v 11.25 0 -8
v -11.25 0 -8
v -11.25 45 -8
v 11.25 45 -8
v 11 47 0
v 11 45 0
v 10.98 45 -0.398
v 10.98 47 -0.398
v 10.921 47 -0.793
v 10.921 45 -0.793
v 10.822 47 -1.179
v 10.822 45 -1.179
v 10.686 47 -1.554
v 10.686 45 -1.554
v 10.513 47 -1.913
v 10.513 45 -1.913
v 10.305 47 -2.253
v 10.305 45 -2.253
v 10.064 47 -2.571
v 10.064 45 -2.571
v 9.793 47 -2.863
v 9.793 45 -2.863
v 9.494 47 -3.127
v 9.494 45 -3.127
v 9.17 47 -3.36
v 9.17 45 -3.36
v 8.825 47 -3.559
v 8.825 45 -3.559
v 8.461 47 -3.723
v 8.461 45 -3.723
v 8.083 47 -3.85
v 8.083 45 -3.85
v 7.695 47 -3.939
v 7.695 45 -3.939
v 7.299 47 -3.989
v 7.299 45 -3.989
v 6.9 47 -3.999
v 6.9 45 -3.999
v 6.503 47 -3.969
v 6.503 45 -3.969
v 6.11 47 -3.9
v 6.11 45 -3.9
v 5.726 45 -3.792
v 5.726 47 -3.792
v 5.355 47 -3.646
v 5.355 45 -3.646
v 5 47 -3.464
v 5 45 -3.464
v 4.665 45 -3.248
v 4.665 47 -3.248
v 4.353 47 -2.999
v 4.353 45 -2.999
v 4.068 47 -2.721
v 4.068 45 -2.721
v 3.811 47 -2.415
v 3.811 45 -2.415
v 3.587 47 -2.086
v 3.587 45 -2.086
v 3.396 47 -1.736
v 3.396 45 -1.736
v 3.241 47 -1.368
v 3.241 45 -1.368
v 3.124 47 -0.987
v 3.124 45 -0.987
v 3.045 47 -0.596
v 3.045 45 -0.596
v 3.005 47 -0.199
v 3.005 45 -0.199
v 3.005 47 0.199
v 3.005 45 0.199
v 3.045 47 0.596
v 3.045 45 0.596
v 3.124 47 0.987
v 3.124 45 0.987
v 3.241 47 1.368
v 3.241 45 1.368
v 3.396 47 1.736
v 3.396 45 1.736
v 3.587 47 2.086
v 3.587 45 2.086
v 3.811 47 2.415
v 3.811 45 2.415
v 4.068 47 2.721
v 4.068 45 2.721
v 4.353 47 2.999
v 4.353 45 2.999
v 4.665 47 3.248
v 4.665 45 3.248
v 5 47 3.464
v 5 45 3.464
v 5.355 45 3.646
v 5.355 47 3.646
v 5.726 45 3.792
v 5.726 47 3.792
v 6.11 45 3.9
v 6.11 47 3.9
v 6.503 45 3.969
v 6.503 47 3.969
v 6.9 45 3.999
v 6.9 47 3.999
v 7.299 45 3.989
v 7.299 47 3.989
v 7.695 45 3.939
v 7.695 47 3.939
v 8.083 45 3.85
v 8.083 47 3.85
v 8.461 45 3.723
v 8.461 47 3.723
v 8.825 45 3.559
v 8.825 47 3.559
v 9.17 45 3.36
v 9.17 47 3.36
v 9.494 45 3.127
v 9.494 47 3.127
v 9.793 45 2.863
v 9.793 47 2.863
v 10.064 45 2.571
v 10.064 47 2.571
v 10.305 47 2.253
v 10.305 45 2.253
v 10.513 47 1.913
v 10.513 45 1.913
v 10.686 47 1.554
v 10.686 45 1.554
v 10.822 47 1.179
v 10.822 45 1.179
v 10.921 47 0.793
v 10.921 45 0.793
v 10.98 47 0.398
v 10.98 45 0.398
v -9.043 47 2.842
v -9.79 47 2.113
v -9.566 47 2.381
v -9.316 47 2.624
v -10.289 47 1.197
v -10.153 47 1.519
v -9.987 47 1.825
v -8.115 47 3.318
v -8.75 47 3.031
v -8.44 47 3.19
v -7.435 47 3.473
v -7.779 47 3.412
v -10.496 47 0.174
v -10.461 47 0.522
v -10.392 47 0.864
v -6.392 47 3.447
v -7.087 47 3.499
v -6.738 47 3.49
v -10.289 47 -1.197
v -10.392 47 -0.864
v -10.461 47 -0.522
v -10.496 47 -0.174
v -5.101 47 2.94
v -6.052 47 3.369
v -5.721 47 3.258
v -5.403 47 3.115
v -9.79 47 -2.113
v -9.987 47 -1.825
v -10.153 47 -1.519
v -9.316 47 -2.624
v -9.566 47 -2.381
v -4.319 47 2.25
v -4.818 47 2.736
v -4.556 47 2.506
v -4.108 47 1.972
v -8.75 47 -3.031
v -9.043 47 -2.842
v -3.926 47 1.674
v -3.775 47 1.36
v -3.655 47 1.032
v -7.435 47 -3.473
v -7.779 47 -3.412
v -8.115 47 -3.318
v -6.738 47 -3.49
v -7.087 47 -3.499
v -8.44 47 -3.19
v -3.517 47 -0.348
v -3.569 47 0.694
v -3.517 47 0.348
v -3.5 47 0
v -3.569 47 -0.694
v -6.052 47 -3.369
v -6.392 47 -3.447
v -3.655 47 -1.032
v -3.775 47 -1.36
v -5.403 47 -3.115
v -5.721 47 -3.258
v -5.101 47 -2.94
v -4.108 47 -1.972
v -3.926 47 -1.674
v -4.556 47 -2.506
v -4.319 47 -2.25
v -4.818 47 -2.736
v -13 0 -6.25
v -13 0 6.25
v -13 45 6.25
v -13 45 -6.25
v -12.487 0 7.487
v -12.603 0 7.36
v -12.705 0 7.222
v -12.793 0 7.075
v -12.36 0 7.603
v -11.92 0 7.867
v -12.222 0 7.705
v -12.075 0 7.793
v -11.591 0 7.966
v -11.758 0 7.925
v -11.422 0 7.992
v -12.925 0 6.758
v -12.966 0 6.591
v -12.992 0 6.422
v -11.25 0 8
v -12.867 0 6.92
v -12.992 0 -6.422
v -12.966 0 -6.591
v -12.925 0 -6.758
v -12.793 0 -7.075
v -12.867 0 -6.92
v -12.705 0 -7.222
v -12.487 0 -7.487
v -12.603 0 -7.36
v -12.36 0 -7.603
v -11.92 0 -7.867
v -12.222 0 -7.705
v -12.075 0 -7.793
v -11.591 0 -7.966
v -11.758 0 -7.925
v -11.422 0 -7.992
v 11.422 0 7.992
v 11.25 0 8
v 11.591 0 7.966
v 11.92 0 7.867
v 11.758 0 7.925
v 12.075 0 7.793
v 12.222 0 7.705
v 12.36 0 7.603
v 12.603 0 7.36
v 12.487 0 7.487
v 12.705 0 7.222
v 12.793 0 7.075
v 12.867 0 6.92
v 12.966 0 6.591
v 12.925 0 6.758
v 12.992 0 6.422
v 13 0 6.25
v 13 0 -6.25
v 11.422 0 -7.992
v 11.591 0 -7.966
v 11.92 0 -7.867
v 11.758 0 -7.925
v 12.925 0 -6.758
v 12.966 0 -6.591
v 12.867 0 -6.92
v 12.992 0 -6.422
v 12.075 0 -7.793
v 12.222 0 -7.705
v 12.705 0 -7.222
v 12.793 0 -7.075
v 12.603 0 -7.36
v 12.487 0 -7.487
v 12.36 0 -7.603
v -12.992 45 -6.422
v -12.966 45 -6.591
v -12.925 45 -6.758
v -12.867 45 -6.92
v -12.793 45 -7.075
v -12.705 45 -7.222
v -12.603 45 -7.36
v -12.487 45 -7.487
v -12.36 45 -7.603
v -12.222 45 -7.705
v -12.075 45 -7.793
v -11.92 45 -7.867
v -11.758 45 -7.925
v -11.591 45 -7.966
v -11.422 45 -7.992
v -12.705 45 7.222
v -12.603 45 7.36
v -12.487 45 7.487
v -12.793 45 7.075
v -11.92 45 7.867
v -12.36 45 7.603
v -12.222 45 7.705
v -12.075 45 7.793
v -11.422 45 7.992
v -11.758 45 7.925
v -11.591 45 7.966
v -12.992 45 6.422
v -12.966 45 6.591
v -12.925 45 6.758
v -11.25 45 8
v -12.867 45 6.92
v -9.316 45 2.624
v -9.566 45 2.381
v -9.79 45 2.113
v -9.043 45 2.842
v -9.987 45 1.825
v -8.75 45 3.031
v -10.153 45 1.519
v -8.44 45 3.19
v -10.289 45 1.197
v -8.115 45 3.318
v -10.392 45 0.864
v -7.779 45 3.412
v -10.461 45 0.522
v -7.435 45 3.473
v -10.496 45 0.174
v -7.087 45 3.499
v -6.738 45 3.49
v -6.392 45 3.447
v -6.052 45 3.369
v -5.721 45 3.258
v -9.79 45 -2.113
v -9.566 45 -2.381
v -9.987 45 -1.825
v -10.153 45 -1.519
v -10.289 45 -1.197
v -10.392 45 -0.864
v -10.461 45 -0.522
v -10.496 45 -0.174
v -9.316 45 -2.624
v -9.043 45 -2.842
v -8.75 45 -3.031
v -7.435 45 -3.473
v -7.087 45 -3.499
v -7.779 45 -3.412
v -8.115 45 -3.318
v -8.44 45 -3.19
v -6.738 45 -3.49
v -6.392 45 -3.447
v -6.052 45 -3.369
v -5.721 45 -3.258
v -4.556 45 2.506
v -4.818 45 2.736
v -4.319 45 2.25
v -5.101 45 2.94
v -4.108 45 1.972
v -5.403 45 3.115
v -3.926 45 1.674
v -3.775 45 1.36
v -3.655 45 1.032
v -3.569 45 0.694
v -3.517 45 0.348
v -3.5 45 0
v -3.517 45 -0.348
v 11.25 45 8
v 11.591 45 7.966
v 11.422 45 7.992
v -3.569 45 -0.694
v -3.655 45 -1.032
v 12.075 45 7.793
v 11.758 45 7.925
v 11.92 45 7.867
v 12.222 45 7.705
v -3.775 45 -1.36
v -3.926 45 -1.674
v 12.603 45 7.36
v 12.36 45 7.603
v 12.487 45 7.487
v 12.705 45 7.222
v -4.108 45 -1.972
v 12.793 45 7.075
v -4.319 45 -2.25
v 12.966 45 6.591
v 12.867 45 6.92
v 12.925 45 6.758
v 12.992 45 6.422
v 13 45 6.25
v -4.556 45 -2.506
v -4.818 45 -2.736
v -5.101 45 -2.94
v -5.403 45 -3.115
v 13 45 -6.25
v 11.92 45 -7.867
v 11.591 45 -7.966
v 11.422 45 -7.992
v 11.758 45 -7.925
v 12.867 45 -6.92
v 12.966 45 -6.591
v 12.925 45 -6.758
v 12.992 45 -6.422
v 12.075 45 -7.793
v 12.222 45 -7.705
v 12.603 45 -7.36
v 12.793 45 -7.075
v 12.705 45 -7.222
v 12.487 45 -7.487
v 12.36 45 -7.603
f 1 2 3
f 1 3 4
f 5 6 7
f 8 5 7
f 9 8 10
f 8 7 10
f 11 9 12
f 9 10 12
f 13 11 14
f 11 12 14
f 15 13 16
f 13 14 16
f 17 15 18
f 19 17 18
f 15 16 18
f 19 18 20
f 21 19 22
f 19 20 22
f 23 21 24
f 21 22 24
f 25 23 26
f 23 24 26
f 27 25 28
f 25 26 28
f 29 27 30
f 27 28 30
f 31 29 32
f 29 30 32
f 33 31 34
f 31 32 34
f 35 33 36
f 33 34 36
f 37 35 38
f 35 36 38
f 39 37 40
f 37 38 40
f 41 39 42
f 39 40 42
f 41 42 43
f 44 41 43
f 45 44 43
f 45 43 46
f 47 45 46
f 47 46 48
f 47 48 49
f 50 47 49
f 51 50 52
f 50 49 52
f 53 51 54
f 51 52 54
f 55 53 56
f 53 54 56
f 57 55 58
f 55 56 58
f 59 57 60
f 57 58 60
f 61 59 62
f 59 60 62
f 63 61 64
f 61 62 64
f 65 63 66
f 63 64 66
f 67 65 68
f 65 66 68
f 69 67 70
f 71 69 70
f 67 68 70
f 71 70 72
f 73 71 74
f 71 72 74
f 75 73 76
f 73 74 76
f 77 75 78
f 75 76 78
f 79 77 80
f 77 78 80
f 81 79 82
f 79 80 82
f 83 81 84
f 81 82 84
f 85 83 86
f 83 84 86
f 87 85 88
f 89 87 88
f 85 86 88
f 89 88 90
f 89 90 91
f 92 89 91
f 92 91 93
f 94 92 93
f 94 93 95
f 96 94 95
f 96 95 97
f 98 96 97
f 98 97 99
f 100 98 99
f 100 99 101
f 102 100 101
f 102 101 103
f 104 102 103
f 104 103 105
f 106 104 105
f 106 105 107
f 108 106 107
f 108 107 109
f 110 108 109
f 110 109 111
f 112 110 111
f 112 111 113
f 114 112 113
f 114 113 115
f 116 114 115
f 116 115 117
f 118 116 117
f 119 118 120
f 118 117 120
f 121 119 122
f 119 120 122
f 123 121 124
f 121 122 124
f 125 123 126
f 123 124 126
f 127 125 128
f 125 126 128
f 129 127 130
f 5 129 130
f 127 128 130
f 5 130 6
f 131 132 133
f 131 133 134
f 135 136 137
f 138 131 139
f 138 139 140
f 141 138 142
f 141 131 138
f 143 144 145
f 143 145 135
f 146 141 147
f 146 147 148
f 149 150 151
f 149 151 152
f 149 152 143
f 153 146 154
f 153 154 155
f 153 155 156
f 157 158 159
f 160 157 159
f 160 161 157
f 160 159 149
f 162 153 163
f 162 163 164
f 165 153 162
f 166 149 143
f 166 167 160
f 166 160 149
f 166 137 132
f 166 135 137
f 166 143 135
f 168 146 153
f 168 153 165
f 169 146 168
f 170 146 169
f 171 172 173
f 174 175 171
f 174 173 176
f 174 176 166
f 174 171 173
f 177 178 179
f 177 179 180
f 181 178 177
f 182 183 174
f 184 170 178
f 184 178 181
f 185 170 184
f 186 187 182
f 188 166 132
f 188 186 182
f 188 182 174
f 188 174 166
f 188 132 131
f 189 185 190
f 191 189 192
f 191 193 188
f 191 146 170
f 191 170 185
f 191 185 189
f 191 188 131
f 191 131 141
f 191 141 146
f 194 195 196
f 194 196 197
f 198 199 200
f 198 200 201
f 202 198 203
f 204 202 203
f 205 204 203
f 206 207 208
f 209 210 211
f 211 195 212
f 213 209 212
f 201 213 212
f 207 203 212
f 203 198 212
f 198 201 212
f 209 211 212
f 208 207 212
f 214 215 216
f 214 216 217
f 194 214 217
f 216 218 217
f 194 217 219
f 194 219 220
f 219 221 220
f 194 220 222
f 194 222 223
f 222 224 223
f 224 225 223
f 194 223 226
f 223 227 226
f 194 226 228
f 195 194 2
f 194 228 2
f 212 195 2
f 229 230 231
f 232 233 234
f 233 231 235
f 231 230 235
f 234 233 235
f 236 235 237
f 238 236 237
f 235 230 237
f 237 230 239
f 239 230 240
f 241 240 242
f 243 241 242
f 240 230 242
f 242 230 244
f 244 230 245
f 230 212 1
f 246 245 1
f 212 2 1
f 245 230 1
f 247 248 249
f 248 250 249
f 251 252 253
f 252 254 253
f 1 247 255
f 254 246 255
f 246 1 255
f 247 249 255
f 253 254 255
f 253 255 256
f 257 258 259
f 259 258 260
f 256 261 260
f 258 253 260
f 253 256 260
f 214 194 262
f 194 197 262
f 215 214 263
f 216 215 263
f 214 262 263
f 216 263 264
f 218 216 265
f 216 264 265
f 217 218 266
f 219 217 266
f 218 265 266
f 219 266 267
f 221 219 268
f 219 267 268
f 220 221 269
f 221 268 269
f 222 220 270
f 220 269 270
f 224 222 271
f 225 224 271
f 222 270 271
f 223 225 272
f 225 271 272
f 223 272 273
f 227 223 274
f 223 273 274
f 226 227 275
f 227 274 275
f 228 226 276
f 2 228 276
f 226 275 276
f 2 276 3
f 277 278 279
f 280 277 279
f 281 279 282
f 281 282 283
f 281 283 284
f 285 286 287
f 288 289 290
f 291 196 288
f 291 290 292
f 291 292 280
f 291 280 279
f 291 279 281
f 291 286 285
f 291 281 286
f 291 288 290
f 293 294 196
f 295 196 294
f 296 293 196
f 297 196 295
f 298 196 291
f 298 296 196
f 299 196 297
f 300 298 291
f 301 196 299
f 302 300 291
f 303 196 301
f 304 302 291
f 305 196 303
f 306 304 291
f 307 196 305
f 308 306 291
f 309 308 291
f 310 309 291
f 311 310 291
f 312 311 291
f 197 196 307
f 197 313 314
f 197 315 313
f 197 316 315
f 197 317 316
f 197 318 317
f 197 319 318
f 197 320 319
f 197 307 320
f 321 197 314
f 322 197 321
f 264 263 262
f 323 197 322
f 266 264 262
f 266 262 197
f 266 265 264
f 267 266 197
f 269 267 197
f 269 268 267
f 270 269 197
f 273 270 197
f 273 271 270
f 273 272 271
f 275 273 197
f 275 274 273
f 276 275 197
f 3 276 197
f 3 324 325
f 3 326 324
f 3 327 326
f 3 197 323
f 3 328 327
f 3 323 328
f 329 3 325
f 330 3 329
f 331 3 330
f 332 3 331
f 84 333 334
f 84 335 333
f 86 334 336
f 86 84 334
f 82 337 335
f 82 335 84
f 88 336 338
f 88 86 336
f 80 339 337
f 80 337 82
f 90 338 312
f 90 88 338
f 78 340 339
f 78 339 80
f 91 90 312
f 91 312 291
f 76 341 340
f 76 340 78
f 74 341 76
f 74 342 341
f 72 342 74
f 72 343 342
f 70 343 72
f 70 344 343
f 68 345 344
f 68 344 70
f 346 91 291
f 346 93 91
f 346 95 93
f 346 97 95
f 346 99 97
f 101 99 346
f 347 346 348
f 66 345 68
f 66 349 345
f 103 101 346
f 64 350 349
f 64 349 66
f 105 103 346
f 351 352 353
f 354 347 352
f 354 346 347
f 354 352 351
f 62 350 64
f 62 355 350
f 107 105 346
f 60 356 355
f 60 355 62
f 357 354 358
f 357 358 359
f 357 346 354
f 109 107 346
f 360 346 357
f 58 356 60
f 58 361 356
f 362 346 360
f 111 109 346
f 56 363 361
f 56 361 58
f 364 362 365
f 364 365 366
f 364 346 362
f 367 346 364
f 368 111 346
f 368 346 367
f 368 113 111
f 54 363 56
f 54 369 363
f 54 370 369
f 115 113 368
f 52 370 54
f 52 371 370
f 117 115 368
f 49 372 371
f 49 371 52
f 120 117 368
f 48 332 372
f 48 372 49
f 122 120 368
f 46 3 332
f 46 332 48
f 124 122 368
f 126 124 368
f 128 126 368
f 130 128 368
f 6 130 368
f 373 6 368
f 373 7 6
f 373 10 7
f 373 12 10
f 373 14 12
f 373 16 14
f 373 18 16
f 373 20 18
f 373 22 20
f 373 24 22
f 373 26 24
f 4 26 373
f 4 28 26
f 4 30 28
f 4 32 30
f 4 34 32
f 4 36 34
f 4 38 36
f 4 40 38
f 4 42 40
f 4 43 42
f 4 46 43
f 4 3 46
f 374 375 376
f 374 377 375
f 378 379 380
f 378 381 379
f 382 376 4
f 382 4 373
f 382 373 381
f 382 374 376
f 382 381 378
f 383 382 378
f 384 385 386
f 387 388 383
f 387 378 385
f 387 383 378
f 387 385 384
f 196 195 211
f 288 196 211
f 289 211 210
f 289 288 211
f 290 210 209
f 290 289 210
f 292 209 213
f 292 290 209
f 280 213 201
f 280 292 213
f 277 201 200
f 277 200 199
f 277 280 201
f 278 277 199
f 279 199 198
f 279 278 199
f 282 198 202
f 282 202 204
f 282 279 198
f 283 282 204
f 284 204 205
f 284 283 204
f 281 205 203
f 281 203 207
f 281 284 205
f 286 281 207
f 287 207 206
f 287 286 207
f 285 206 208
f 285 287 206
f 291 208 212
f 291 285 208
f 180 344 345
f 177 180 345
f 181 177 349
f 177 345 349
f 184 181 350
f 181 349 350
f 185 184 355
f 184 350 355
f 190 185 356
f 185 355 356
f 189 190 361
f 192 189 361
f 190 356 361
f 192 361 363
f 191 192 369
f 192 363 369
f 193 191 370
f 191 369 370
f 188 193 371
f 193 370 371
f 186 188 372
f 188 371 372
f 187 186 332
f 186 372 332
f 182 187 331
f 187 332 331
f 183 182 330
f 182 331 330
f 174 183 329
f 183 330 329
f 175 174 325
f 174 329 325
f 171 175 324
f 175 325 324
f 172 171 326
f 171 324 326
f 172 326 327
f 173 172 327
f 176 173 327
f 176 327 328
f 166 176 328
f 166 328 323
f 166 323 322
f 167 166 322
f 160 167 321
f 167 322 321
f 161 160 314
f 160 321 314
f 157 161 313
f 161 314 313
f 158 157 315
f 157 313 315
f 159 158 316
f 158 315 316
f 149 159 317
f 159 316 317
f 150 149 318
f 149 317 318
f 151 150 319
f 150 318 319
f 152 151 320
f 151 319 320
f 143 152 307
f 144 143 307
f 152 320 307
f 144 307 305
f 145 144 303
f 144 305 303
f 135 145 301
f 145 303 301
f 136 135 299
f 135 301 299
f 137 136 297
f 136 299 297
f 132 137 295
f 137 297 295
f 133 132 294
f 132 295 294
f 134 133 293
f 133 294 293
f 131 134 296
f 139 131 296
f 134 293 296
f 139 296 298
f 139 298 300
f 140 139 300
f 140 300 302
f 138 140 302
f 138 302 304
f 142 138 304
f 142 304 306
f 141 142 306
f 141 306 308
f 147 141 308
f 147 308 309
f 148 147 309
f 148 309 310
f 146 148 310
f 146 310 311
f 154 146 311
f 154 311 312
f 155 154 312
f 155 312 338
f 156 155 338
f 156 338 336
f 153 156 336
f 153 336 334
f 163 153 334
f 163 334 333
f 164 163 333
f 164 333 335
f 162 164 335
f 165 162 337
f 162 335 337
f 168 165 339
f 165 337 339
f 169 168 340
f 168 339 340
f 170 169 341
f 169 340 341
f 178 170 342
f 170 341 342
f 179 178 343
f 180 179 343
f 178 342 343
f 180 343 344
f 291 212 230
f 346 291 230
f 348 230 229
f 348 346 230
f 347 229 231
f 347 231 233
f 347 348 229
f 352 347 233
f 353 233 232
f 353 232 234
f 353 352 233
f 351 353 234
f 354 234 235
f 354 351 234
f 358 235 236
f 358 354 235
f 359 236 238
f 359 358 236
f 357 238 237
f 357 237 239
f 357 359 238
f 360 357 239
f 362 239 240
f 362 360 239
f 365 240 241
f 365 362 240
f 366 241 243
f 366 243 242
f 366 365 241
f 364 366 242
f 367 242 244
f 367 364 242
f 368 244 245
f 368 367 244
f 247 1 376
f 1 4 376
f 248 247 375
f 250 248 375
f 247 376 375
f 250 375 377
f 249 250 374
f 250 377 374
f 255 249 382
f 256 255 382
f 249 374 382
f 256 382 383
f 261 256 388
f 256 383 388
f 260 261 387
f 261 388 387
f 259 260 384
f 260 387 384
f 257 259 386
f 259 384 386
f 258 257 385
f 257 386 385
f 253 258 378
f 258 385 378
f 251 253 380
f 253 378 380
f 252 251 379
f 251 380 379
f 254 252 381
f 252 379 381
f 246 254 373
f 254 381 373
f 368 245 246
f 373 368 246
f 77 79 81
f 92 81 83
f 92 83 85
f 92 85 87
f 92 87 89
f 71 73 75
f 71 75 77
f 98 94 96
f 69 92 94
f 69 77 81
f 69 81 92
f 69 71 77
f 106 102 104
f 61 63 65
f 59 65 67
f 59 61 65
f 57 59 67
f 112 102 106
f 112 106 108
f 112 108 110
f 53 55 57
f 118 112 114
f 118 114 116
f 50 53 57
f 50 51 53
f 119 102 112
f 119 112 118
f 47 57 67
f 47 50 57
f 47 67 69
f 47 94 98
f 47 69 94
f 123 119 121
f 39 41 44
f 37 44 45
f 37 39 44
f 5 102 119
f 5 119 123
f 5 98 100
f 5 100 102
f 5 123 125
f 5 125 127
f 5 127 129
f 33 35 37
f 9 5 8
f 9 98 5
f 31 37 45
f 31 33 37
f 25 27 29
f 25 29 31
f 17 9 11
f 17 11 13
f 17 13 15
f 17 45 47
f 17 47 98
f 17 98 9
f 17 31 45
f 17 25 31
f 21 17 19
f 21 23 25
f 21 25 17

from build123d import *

# Parameters (mm, degrees)
SKETCH1_W           = 26
SKETCH1_H           = 16
BOSS_EXTRUDE1_DEPTH = 45
SKETCH2_R           = 3.5
SKETCH2_R_2         = 4
BOSS_EXTRUDE2_DEPTH = 2
FILLET1_R           = 1.75


with BuildPart() as part:
    # Sketch1 → Boss-Extrude1 (new body)
    with BuildSketch(Plane(origin=(0, 0, 0), x_dir=(1, 0, 0), z_dir=(0, 1, 0))):
        Rectangle(SKETCH1_W, SKETCH1_H)
    extrude(amount=BOSS_EXTRUDE1_DEPTH)

    # Sketch2 → Boss-Extrude2 (add)
    with BuildSketch(Plane(origin=(0, 45, 0), x_dir=(1, 0, 0), z_dir=(0, 1, 0))):
        with Locations((-7, 0)):
            Circle(SKETCH2_R)
        with Locations((7, 0)):
            Circle(SKETCH2_R_2)
    extrude(amount=BOSS_EXTRUDE2_DEPTH)

    # Fillet1
    fillet1_edges = [part.edges().sort_by_distance(p)[0] for p in [
        (13, 22.5, 8),
        (-13, 22.5, 8),
        (-13, 22.5, -8),
        (13, 22.5, -8),
    ]]
    fillet(fillet1_edges, radius=FILLET1_R)


solid = part.part
